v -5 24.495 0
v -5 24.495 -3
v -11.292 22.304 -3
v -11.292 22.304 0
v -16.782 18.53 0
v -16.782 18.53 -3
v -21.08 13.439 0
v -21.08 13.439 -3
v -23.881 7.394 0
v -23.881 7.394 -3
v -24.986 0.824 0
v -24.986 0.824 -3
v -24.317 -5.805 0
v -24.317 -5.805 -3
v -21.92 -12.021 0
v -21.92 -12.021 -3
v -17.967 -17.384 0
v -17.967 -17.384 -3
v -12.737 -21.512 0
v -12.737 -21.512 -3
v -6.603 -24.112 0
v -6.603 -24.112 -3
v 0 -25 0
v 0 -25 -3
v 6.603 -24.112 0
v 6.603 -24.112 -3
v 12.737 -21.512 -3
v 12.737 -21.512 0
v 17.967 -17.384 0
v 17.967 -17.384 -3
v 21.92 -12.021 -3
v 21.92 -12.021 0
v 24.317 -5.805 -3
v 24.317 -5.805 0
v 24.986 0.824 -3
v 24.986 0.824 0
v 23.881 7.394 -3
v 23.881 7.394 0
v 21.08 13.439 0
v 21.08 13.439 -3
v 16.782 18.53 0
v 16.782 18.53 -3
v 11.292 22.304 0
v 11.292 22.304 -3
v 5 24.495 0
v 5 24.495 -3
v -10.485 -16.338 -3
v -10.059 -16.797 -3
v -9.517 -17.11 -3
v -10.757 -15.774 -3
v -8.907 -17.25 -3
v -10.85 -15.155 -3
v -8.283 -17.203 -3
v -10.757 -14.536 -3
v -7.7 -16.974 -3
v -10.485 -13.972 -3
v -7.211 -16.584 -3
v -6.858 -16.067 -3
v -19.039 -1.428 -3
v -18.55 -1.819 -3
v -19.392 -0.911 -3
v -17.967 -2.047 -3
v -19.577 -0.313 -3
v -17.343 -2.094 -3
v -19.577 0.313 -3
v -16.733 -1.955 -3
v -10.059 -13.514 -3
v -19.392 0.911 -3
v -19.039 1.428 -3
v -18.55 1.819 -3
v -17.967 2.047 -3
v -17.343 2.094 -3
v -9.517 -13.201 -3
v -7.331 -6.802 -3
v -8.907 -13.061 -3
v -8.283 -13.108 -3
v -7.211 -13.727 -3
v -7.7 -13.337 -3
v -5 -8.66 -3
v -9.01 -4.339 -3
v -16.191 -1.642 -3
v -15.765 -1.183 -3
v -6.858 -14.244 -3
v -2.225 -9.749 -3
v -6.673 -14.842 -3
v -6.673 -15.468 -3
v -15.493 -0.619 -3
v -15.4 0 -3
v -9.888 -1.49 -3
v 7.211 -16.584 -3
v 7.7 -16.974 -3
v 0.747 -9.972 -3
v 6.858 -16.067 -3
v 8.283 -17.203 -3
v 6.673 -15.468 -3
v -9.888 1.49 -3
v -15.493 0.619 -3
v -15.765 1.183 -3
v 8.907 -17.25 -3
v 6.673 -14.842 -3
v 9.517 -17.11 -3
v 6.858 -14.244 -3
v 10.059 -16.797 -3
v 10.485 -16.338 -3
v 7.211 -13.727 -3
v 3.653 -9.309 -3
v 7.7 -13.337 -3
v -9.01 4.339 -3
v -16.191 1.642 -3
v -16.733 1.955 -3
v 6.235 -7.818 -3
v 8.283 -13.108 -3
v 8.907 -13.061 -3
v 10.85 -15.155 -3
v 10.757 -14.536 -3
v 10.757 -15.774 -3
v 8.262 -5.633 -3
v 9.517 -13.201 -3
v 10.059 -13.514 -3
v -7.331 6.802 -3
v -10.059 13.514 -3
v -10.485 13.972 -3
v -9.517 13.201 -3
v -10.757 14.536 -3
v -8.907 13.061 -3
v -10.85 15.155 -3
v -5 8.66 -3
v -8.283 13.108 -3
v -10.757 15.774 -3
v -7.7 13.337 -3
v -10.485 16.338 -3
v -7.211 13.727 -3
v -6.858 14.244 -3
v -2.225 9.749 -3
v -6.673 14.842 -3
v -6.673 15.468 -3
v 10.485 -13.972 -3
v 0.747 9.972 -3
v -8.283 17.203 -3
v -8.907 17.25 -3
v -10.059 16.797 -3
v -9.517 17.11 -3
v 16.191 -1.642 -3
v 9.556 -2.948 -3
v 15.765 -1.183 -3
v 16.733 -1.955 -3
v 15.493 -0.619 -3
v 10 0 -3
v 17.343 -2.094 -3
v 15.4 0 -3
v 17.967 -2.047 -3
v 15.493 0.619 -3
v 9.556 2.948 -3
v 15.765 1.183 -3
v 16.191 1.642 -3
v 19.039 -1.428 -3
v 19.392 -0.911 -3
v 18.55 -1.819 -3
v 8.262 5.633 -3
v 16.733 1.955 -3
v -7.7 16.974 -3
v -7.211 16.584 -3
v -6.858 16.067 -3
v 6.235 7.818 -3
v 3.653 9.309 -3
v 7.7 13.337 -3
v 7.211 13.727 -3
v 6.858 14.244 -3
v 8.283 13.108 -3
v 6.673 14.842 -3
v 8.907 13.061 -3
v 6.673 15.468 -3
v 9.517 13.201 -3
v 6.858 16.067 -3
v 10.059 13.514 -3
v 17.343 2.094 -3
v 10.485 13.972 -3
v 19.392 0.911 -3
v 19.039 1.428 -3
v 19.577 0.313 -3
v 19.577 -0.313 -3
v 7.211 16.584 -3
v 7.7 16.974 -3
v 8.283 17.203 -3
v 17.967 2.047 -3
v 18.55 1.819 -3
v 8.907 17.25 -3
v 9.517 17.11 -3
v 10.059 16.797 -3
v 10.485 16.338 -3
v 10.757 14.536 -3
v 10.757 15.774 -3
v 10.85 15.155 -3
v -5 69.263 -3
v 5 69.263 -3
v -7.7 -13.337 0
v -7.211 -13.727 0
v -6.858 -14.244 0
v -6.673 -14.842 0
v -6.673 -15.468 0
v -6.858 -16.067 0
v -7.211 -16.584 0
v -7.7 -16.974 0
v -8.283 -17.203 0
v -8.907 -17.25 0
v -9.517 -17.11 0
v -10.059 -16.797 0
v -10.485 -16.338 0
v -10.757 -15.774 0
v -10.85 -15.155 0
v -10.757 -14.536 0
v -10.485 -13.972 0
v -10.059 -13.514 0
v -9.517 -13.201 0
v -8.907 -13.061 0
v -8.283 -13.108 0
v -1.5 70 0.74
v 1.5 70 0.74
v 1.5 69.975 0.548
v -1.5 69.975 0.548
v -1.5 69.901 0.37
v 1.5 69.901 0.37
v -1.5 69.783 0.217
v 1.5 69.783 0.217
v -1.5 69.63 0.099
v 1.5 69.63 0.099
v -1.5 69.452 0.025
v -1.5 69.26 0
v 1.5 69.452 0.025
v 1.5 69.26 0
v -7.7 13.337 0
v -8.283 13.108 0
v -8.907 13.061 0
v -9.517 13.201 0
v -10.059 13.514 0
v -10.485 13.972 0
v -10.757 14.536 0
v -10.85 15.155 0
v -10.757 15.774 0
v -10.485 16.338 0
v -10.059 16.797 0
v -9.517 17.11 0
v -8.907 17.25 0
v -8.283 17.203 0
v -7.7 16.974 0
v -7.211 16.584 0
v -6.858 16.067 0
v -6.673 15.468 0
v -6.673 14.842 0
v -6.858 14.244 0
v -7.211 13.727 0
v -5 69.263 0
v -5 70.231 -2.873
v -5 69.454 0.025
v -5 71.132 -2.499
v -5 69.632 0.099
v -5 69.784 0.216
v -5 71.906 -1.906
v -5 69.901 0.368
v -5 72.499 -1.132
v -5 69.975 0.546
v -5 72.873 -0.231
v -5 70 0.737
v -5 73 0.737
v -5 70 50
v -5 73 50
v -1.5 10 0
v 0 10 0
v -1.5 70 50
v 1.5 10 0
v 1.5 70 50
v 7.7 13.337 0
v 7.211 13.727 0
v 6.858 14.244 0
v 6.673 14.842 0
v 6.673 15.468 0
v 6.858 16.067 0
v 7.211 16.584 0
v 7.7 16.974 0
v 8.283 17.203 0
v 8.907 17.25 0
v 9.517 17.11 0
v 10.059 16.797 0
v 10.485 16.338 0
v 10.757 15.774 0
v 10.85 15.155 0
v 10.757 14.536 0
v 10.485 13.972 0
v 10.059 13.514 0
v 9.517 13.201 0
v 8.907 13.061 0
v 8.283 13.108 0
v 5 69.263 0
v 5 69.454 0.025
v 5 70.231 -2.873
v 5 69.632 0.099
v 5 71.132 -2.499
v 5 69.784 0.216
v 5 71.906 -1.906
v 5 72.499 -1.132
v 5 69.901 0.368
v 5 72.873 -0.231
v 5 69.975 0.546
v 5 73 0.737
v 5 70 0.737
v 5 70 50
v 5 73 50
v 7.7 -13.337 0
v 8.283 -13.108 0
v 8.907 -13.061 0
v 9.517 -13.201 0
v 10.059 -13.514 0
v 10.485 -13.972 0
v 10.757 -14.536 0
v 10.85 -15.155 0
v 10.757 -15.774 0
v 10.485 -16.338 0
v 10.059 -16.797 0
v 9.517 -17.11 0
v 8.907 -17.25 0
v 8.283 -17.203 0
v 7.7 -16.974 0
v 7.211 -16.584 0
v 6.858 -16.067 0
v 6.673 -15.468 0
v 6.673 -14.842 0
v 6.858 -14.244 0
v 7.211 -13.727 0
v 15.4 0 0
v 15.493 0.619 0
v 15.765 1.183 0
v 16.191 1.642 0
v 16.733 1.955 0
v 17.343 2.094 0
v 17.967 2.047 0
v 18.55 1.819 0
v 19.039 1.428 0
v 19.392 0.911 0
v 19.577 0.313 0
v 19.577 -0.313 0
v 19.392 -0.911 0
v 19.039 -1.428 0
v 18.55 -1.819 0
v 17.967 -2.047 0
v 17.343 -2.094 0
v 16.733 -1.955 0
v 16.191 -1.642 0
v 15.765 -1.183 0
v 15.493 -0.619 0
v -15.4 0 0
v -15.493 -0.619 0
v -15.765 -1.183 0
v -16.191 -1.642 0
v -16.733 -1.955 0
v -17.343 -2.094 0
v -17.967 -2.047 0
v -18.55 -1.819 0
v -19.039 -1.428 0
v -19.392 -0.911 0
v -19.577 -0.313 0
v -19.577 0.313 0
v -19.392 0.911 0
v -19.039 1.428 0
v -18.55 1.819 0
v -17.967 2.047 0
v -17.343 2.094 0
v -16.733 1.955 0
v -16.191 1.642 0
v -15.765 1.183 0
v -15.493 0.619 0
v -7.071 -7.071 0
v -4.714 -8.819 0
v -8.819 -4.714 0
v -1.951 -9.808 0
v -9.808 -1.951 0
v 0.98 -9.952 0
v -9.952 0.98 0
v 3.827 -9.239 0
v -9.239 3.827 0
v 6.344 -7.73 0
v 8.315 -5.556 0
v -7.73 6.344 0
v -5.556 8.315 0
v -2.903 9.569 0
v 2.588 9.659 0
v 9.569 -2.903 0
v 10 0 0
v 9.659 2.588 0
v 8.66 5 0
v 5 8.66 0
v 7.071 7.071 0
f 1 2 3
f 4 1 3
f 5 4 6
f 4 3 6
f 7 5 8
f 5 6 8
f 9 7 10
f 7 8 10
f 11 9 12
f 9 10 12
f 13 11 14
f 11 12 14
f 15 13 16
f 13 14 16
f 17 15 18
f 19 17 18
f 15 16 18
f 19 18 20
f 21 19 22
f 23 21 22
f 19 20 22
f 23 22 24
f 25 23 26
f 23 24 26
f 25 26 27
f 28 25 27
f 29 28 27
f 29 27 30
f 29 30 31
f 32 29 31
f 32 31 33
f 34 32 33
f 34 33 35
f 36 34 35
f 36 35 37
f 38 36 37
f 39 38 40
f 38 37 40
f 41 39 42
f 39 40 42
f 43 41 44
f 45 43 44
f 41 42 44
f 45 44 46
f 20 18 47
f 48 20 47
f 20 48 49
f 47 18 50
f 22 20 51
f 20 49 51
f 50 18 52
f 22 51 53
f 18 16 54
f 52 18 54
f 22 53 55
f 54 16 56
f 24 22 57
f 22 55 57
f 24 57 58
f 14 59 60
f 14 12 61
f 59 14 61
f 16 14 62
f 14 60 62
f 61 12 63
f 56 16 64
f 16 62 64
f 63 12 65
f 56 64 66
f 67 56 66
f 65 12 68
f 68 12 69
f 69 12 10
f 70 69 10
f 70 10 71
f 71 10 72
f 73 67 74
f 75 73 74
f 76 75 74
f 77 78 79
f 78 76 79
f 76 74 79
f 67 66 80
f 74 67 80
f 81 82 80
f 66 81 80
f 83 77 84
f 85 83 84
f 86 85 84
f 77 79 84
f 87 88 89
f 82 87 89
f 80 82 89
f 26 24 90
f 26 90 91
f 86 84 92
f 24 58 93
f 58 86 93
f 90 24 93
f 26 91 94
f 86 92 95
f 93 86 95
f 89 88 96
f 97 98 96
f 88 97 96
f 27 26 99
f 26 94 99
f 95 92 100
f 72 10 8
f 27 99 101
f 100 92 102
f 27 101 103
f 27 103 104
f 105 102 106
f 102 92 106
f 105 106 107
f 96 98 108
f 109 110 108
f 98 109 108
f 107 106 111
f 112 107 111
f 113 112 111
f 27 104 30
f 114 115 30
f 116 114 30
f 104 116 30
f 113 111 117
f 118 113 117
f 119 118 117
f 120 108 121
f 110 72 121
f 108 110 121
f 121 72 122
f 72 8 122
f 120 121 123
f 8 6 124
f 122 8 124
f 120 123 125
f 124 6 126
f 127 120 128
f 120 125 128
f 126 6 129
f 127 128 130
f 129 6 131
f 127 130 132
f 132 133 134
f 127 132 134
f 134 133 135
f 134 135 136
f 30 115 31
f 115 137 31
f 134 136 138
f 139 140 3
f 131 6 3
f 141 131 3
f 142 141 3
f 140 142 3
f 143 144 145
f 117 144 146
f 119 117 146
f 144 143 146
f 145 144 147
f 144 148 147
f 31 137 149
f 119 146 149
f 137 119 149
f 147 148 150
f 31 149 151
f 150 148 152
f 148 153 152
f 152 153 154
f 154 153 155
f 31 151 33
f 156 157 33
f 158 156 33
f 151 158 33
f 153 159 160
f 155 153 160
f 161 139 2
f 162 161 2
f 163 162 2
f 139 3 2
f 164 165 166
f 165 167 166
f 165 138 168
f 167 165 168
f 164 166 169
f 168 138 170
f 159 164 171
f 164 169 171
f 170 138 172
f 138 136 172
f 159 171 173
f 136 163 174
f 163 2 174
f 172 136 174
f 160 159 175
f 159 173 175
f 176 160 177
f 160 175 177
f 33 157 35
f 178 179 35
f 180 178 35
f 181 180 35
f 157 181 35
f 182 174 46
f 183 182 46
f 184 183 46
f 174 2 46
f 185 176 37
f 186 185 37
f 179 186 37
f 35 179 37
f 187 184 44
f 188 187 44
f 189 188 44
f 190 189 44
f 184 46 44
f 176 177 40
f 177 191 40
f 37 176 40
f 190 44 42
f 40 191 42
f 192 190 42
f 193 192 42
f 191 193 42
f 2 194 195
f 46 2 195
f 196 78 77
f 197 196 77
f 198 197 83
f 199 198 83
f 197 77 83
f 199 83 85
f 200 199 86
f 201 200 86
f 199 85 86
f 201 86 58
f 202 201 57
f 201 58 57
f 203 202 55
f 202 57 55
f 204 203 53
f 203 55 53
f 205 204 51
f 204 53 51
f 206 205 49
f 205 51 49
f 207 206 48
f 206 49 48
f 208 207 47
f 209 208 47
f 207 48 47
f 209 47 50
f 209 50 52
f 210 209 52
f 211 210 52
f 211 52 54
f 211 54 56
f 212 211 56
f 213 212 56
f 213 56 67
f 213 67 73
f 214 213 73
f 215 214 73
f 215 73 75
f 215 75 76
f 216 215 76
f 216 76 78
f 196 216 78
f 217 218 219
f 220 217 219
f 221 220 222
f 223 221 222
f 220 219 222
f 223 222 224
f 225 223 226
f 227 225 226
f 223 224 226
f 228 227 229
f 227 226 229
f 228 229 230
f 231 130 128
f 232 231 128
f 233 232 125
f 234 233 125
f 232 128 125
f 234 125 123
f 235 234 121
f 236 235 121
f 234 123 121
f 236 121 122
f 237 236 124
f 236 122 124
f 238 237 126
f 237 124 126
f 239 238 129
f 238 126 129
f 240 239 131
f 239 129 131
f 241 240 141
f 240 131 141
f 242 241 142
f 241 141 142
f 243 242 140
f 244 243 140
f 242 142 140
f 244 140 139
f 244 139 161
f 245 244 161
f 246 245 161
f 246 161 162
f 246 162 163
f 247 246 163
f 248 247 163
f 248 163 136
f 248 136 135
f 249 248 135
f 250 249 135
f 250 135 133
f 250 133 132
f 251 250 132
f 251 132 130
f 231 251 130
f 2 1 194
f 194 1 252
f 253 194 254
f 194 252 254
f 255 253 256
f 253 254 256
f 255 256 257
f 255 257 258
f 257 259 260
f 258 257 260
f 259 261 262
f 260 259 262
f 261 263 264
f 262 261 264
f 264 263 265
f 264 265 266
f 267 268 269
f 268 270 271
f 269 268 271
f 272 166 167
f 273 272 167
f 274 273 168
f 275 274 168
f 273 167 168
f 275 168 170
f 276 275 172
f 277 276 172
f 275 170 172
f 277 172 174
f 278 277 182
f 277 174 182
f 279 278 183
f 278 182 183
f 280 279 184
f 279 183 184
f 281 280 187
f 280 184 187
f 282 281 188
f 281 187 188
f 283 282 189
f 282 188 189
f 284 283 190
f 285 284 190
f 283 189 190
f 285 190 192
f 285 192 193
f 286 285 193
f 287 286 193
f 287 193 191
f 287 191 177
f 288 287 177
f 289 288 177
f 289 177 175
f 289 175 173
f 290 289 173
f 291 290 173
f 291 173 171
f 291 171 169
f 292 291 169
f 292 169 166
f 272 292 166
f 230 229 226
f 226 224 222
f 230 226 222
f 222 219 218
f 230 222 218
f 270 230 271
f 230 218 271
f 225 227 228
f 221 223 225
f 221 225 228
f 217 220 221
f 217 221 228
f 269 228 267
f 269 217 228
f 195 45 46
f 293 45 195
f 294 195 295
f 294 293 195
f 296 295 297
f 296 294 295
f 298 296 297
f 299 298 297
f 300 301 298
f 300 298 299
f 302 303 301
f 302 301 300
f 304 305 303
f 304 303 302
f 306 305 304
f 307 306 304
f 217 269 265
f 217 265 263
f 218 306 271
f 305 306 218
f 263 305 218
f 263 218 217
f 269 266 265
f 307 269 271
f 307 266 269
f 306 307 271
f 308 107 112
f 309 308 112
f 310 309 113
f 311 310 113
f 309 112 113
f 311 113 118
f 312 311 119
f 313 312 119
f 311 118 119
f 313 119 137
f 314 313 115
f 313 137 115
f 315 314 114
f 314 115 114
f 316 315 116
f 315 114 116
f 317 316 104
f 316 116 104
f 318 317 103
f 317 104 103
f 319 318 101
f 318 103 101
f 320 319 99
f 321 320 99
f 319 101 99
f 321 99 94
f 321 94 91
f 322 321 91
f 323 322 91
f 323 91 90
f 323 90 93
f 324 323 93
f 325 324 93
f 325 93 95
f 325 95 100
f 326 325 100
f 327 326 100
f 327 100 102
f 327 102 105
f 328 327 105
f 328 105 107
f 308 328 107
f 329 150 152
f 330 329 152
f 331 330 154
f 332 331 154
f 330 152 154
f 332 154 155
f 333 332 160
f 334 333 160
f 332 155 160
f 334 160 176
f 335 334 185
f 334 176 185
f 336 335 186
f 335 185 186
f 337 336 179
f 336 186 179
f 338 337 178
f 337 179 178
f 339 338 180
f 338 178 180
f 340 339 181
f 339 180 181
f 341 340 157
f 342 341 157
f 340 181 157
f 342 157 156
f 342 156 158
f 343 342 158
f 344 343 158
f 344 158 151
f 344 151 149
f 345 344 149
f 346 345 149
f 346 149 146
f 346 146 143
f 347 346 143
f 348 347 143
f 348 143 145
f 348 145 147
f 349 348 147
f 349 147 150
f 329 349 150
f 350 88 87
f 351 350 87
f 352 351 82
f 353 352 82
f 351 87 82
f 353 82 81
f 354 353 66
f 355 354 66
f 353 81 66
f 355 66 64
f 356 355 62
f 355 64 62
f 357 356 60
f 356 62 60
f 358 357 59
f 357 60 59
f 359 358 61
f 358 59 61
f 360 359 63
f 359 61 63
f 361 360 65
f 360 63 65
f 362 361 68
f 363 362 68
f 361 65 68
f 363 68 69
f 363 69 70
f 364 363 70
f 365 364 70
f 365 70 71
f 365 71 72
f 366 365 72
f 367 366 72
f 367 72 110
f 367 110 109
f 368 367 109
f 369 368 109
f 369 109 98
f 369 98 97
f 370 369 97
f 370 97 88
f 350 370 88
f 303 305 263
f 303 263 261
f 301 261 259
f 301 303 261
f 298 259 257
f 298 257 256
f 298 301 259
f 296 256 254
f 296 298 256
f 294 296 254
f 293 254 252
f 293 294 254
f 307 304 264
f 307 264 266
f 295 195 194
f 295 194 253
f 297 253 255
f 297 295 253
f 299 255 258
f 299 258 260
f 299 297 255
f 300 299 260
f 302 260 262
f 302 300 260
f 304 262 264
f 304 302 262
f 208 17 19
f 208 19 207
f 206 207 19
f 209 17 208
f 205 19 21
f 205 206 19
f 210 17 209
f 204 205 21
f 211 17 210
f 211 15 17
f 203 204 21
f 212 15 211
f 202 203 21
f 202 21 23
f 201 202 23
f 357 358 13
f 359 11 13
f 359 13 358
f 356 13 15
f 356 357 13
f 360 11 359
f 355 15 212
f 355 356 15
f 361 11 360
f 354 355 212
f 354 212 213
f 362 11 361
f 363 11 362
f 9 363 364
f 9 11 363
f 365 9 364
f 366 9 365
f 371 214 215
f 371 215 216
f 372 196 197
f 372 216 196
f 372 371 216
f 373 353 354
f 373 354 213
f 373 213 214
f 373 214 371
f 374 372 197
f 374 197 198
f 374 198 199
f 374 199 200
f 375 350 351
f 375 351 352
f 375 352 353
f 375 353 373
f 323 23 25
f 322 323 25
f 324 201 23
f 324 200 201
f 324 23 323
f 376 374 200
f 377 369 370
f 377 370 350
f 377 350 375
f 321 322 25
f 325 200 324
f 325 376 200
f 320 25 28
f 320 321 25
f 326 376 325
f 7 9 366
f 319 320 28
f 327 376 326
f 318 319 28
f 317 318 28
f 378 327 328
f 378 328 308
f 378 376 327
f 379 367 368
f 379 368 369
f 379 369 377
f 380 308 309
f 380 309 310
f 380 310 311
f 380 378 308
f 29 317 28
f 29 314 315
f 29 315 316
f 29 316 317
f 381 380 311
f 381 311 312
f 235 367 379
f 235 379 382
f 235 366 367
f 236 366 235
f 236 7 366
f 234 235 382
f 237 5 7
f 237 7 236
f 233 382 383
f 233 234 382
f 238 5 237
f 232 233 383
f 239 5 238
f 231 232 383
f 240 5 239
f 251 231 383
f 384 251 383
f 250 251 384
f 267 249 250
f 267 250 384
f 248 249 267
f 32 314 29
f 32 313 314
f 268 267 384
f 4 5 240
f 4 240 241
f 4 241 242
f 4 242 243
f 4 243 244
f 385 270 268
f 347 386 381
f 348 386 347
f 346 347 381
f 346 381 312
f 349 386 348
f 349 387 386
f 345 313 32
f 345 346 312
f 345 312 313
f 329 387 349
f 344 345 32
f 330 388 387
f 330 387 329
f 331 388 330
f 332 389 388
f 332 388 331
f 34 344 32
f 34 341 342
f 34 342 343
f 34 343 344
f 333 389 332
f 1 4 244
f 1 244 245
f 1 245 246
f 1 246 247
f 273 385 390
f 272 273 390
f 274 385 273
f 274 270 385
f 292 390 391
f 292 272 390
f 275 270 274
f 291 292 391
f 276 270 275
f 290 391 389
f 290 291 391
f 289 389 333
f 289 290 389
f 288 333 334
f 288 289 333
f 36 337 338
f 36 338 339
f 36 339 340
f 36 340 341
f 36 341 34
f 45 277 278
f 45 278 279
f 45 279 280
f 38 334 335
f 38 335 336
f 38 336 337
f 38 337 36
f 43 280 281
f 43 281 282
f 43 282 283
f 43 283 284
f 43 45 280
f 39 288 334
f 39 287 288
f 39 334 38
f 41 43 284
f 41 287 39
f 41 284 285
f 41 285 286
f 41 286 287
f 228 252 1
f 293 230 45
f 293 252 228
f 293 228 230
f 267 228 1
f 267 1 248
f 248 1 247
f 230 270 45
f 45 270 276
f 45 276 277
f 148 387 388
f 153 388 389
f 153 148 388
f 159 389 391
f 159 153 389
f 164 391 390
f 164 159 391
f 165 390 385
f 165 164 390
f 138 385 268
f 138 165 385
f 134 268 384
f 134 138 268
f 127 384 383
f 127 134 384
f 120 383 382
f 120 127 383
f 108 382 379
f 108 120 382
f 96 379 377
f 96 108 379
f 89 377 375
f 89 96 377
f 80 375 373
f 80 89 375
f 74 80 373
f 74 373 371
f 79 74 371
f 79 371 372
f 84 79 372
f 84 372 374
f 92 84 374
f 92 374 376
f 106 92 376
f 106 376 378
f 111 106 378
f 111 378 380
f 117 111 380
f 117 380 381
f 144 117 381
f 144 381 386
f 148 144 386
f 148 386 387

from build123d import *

# Parameters (mm, degrees)
BASE_FLANGE2_START           = -3
BASE_FLANGE2_OUTLINE_R       = 10
BASE_FLANGE2_DEPTH           = 3
EDGE_FLANGE1_STRIP_W         = 13.4732
EDGE_FLANGE1_STRIP_H         = 3
EDGE_FLANGE1_STRIP_CUT_DEPTH = 10
EDGE_FLANGE1_DEPTH           = 10
BOSS_EXTRUDE1_START          = -3.5
BOSS_EXTRUDE1_DEPTH          = 3
TAP_DRILL_FOR_M5X0_8_TAP2_D  = 4.2
CIRPATTERN2_COUNT            = 6


# Read off the part's stored shape, not the designer's step: Base-Flange2
# Sheet-metal steps are written as plain solids
with BuildPart() as part:
    # Base-Flange2 outline → Base-Flange2 (new body)
    with BuildSketch(Plane.XY.offset(BASE_FLANGE2_START)):
        with BuildLine():
            Line((5, 70), (-5, 70))
            Line((-5, 70), (-5, 24.494897428))
            ThreePointArc((-5, 24.494897428), (0, -25), (5, 24.494897428))
            Line((5, 24.494897428), (5, 70))
        make_face()
        Circle(BASE_FLANGE2_OUTLINE_R, mode=Mode.SUBTRACT)
    extrude(amount=BASE_FLANGE2_DEPTH)

    # Edge-Flange1 strip (across the edge) → Edge-Flange1 strip cut (cut)
    with BuildSketch(Plane(origin=(5, 70, 0), x_dir=(0, -1, 0), z_dir=(-1, 0, 0))):
        with Locations((-6, -1.5)):
            Rectangle(EDGE_FLANGE1_STRIP_W, EDGE_FLANGE1_STRIP_H)
    extrude(amount=EDGE_FLANGE1_STRIP_CUT_DEPTH, mode=Mode.SUBTRACT)

    # Edge-Flange1 section (across the edge) → Edge-Flange1 (add)
    with BuildSketch(Plane(origin=(5, 70, 0), x_dir=(0, -1, 0), z_dir=(-1, 0, 0))):
        with BuildLine():
            Line((-3, 0.7366), (-3, 50))
            Line((-3, 50), (0, 50))
            Line((0, 50), (0, 0.7366))
            ThreePointArc((0, 0.7366), (0.215745145, 0.215745145), (0.7366, 0))
            Line((0.7366, 0), (0.7366, -3))
            ThreePointArc((0.7366, -3), (-1.905575199, -1.905575199), (-3, 0.7366))
        make_face()
    extrude(amount=EDGE_FLANGE1_DEPTH)

    # Sketch13 → Boss-Extrude1 (add)
    with BuildSketch(Plane(origin=(5, 0, 0), x_dir=(0, 0, -1), z_dir=(1, 0, 0)).offset(BOSS_EXTRUDE1_START)):
        with BuildLine():
            Line((-50, 70), (-0.74, 70))
            ThreePointArc((-0.74, 70), (-0.216740982, 69.783259018), (0, 69.26))
            Line((0, 69.26), (0, 10))
            Line((0, 10), (-50, 70))
        make_face()
    extrude(amount=-BOSS_EXTRUDE1_DEPTH)

    # Tap Drill for M5x0.8 Tap2 (through all)
    with Locations(Plane.XY):
        with Locations((17.5, 0)):
            tap_drill_for_m5x0_8_tap2 = Hole(TAP_DRILL_FOR_M5X0_8_TAP2_D / 2)

    # CirPattern2: Tap Drill for M5x0.8 Tap2 ×6 about axis
    cirpattern2_axis = Axis((0, 0, 0), (0, 0, 1))
    for i in range(1, CIRPATTERN2_COUNT):
        add(tap_drill_for_m5x0_8_tap2.rotate(cirpattern2_axis, i * 360 / CIRPATTERN2_COUNT), mode=Mode.SUBTRACT)


solid = part.part
